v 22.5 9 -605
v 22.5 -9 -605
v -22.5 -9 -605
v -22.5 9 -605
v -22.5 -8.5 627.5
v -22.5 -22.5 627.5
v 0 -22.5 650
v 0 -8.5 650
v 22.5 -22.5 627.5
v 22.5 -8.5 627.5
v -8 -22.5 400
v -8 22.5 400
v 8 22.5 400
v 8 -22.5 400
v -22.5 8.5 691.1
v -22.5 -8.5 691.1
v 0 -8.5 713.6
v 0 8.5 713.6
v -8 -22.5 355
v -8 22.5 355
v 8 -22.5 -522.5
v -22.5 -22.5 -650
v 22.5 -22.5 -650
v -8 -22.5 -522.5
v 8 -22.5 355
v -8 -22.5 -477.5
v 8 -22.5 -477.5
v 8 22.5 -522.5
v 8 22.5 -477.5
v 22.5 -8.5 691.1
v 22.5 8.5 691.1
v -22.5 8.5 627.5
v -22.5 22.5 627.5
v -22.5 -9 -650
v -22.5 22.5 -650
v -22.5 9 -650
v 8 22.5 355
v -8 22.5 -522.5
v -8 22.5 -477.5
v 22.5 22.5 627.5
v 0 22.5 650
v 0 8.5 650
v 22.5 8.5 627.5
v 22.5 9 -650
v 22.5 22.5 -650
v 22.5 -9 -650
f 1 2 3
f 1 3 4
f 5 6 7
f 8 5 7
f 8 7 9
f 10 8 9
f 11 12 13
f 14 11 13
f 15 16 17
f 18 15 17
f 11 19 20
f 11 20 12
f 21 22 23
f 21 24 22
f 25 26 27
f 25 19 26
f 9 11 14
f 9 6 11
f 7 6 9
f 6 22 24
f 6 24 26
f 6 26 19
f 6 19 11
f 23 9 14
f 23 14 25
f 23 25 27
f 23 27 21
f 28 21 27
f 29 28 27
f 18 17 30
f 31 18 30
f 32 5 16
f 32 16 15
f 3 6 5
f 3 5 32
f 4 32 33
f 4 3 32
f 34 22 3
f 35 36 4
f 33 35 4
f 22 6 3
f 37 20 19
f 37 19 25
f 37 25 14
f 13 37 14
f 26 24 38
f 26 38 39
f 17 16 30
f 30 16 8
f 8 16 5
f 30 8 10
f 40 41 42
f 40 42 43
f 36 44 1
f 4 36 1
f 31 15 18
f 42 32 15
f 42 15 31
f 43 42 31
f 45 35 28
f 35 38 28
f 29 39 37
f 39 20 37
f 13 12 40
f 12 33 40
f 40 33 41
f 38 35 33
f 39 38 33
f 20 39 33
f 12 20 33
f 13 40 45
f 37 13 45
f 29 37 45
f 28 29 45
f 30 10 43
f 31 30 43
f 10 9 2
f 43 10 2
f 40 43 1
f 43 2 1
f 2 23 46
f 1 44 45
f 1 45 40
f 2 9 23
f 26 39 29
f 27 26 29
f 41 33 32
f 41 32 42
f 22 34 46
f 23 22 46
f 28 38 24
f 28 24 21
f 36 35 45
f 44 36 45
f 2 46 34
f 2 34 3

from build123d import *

# Parameters (mm, degrees)
F0_W      = 45
F0_H      = 45
F1_DEPTH  = 650
F3_DEPTH  = 14
F4_W      = 16
F4_H      = 45
F5_DEPTH  = 45.001
F6_W      = 18
F6_H      = 45
F7_DEPTH  = 45.001
F8_W      = 16
F8_H      = 45
F9_DEPTH  = 45.001
F10_W     = 45
F10_H     = 17
F11_DEPTH = 63.6
F13_DEPTH = 31.001


# Not quite as in the source:
# - a pattern or mirror of a feature is missing from the dataset's text; its kind, count and spacing are read off the source's solid


with BuildPart() as f1:
    # F0 (on Top) → F1 (new body, symmetric)
    with BuildSketch(Plane.XY):
        Rectangle(F0_W, F0_H)
    extrude(amount=F1_DEPTH, both=True)

    # F2 (on face) → F3 (cut)
    with BuildSketch(Plane.XZ.offset(22.5)):
        Polygon((22.5, 650), (0, 650), (22.5, 627.5), align=None)
        Polygon((-22.5, 627.5), (0, 650), (-22.5, 650), align=None)
    f3 = extrude(amount=-F3_DEPTH, mode=Mode.SUBTRACT)

    # F3_copies: F3 across plane
    add(f3.mirror(Plane.ZX), mode=Mode.SUBTRACT)

    # F4 (on face) → F5 (cut, through all)
    with BuildSketch(Plane.XZ.offset(22.5)):
        with Locations((0, -500)):
            Rectangle(F4_W, F4_H)
    extrude(amount=-F5_DEPTH, mode=Mode.SUBTRACT)

    # F6 (on face) → F7 (cut, through all)
    with BuildSketch(Plane.YZ.offset(22.5)):
        with Locations((0, -627.5)):
            Rectangle(F6_W, F6_H)
    extrude(amount=-F7_DEPTH, mode=Mode.SUBTRACT)

    # F8 (on face) → F9 (cut, through all)
    with BuildSketch(Plane.XZ.offset(22.5)):
        with Locations((0, 377.5)):
            Rectangle(F8_W, F8_H)
    extrude(amount=-F9_DEPTH, mode=Mode.SUBTRACT)

    # F10 (on face) → F11 (join)
    with BuildSketch(Plane.XY.offset(650)):
        Rectangle(F10_W, F10_H)
    extrude(amount=F11_DEPTH)

    # F12 (on face) → F13 (cut, through all)
    with BuildSketch(Plane.XZ.offset(8.5)):
        Polygon((-22.5, 691.1), (0, 713.6), (-22.5, 713.6), align=None)
        Polygon((22.5, 713.6), (0, 713.6), (22.5, 691.1), align=None)
    extrude(amount=-F13_DEPTH, mode=Mode.SUBTRACT)


solid = f1.part
